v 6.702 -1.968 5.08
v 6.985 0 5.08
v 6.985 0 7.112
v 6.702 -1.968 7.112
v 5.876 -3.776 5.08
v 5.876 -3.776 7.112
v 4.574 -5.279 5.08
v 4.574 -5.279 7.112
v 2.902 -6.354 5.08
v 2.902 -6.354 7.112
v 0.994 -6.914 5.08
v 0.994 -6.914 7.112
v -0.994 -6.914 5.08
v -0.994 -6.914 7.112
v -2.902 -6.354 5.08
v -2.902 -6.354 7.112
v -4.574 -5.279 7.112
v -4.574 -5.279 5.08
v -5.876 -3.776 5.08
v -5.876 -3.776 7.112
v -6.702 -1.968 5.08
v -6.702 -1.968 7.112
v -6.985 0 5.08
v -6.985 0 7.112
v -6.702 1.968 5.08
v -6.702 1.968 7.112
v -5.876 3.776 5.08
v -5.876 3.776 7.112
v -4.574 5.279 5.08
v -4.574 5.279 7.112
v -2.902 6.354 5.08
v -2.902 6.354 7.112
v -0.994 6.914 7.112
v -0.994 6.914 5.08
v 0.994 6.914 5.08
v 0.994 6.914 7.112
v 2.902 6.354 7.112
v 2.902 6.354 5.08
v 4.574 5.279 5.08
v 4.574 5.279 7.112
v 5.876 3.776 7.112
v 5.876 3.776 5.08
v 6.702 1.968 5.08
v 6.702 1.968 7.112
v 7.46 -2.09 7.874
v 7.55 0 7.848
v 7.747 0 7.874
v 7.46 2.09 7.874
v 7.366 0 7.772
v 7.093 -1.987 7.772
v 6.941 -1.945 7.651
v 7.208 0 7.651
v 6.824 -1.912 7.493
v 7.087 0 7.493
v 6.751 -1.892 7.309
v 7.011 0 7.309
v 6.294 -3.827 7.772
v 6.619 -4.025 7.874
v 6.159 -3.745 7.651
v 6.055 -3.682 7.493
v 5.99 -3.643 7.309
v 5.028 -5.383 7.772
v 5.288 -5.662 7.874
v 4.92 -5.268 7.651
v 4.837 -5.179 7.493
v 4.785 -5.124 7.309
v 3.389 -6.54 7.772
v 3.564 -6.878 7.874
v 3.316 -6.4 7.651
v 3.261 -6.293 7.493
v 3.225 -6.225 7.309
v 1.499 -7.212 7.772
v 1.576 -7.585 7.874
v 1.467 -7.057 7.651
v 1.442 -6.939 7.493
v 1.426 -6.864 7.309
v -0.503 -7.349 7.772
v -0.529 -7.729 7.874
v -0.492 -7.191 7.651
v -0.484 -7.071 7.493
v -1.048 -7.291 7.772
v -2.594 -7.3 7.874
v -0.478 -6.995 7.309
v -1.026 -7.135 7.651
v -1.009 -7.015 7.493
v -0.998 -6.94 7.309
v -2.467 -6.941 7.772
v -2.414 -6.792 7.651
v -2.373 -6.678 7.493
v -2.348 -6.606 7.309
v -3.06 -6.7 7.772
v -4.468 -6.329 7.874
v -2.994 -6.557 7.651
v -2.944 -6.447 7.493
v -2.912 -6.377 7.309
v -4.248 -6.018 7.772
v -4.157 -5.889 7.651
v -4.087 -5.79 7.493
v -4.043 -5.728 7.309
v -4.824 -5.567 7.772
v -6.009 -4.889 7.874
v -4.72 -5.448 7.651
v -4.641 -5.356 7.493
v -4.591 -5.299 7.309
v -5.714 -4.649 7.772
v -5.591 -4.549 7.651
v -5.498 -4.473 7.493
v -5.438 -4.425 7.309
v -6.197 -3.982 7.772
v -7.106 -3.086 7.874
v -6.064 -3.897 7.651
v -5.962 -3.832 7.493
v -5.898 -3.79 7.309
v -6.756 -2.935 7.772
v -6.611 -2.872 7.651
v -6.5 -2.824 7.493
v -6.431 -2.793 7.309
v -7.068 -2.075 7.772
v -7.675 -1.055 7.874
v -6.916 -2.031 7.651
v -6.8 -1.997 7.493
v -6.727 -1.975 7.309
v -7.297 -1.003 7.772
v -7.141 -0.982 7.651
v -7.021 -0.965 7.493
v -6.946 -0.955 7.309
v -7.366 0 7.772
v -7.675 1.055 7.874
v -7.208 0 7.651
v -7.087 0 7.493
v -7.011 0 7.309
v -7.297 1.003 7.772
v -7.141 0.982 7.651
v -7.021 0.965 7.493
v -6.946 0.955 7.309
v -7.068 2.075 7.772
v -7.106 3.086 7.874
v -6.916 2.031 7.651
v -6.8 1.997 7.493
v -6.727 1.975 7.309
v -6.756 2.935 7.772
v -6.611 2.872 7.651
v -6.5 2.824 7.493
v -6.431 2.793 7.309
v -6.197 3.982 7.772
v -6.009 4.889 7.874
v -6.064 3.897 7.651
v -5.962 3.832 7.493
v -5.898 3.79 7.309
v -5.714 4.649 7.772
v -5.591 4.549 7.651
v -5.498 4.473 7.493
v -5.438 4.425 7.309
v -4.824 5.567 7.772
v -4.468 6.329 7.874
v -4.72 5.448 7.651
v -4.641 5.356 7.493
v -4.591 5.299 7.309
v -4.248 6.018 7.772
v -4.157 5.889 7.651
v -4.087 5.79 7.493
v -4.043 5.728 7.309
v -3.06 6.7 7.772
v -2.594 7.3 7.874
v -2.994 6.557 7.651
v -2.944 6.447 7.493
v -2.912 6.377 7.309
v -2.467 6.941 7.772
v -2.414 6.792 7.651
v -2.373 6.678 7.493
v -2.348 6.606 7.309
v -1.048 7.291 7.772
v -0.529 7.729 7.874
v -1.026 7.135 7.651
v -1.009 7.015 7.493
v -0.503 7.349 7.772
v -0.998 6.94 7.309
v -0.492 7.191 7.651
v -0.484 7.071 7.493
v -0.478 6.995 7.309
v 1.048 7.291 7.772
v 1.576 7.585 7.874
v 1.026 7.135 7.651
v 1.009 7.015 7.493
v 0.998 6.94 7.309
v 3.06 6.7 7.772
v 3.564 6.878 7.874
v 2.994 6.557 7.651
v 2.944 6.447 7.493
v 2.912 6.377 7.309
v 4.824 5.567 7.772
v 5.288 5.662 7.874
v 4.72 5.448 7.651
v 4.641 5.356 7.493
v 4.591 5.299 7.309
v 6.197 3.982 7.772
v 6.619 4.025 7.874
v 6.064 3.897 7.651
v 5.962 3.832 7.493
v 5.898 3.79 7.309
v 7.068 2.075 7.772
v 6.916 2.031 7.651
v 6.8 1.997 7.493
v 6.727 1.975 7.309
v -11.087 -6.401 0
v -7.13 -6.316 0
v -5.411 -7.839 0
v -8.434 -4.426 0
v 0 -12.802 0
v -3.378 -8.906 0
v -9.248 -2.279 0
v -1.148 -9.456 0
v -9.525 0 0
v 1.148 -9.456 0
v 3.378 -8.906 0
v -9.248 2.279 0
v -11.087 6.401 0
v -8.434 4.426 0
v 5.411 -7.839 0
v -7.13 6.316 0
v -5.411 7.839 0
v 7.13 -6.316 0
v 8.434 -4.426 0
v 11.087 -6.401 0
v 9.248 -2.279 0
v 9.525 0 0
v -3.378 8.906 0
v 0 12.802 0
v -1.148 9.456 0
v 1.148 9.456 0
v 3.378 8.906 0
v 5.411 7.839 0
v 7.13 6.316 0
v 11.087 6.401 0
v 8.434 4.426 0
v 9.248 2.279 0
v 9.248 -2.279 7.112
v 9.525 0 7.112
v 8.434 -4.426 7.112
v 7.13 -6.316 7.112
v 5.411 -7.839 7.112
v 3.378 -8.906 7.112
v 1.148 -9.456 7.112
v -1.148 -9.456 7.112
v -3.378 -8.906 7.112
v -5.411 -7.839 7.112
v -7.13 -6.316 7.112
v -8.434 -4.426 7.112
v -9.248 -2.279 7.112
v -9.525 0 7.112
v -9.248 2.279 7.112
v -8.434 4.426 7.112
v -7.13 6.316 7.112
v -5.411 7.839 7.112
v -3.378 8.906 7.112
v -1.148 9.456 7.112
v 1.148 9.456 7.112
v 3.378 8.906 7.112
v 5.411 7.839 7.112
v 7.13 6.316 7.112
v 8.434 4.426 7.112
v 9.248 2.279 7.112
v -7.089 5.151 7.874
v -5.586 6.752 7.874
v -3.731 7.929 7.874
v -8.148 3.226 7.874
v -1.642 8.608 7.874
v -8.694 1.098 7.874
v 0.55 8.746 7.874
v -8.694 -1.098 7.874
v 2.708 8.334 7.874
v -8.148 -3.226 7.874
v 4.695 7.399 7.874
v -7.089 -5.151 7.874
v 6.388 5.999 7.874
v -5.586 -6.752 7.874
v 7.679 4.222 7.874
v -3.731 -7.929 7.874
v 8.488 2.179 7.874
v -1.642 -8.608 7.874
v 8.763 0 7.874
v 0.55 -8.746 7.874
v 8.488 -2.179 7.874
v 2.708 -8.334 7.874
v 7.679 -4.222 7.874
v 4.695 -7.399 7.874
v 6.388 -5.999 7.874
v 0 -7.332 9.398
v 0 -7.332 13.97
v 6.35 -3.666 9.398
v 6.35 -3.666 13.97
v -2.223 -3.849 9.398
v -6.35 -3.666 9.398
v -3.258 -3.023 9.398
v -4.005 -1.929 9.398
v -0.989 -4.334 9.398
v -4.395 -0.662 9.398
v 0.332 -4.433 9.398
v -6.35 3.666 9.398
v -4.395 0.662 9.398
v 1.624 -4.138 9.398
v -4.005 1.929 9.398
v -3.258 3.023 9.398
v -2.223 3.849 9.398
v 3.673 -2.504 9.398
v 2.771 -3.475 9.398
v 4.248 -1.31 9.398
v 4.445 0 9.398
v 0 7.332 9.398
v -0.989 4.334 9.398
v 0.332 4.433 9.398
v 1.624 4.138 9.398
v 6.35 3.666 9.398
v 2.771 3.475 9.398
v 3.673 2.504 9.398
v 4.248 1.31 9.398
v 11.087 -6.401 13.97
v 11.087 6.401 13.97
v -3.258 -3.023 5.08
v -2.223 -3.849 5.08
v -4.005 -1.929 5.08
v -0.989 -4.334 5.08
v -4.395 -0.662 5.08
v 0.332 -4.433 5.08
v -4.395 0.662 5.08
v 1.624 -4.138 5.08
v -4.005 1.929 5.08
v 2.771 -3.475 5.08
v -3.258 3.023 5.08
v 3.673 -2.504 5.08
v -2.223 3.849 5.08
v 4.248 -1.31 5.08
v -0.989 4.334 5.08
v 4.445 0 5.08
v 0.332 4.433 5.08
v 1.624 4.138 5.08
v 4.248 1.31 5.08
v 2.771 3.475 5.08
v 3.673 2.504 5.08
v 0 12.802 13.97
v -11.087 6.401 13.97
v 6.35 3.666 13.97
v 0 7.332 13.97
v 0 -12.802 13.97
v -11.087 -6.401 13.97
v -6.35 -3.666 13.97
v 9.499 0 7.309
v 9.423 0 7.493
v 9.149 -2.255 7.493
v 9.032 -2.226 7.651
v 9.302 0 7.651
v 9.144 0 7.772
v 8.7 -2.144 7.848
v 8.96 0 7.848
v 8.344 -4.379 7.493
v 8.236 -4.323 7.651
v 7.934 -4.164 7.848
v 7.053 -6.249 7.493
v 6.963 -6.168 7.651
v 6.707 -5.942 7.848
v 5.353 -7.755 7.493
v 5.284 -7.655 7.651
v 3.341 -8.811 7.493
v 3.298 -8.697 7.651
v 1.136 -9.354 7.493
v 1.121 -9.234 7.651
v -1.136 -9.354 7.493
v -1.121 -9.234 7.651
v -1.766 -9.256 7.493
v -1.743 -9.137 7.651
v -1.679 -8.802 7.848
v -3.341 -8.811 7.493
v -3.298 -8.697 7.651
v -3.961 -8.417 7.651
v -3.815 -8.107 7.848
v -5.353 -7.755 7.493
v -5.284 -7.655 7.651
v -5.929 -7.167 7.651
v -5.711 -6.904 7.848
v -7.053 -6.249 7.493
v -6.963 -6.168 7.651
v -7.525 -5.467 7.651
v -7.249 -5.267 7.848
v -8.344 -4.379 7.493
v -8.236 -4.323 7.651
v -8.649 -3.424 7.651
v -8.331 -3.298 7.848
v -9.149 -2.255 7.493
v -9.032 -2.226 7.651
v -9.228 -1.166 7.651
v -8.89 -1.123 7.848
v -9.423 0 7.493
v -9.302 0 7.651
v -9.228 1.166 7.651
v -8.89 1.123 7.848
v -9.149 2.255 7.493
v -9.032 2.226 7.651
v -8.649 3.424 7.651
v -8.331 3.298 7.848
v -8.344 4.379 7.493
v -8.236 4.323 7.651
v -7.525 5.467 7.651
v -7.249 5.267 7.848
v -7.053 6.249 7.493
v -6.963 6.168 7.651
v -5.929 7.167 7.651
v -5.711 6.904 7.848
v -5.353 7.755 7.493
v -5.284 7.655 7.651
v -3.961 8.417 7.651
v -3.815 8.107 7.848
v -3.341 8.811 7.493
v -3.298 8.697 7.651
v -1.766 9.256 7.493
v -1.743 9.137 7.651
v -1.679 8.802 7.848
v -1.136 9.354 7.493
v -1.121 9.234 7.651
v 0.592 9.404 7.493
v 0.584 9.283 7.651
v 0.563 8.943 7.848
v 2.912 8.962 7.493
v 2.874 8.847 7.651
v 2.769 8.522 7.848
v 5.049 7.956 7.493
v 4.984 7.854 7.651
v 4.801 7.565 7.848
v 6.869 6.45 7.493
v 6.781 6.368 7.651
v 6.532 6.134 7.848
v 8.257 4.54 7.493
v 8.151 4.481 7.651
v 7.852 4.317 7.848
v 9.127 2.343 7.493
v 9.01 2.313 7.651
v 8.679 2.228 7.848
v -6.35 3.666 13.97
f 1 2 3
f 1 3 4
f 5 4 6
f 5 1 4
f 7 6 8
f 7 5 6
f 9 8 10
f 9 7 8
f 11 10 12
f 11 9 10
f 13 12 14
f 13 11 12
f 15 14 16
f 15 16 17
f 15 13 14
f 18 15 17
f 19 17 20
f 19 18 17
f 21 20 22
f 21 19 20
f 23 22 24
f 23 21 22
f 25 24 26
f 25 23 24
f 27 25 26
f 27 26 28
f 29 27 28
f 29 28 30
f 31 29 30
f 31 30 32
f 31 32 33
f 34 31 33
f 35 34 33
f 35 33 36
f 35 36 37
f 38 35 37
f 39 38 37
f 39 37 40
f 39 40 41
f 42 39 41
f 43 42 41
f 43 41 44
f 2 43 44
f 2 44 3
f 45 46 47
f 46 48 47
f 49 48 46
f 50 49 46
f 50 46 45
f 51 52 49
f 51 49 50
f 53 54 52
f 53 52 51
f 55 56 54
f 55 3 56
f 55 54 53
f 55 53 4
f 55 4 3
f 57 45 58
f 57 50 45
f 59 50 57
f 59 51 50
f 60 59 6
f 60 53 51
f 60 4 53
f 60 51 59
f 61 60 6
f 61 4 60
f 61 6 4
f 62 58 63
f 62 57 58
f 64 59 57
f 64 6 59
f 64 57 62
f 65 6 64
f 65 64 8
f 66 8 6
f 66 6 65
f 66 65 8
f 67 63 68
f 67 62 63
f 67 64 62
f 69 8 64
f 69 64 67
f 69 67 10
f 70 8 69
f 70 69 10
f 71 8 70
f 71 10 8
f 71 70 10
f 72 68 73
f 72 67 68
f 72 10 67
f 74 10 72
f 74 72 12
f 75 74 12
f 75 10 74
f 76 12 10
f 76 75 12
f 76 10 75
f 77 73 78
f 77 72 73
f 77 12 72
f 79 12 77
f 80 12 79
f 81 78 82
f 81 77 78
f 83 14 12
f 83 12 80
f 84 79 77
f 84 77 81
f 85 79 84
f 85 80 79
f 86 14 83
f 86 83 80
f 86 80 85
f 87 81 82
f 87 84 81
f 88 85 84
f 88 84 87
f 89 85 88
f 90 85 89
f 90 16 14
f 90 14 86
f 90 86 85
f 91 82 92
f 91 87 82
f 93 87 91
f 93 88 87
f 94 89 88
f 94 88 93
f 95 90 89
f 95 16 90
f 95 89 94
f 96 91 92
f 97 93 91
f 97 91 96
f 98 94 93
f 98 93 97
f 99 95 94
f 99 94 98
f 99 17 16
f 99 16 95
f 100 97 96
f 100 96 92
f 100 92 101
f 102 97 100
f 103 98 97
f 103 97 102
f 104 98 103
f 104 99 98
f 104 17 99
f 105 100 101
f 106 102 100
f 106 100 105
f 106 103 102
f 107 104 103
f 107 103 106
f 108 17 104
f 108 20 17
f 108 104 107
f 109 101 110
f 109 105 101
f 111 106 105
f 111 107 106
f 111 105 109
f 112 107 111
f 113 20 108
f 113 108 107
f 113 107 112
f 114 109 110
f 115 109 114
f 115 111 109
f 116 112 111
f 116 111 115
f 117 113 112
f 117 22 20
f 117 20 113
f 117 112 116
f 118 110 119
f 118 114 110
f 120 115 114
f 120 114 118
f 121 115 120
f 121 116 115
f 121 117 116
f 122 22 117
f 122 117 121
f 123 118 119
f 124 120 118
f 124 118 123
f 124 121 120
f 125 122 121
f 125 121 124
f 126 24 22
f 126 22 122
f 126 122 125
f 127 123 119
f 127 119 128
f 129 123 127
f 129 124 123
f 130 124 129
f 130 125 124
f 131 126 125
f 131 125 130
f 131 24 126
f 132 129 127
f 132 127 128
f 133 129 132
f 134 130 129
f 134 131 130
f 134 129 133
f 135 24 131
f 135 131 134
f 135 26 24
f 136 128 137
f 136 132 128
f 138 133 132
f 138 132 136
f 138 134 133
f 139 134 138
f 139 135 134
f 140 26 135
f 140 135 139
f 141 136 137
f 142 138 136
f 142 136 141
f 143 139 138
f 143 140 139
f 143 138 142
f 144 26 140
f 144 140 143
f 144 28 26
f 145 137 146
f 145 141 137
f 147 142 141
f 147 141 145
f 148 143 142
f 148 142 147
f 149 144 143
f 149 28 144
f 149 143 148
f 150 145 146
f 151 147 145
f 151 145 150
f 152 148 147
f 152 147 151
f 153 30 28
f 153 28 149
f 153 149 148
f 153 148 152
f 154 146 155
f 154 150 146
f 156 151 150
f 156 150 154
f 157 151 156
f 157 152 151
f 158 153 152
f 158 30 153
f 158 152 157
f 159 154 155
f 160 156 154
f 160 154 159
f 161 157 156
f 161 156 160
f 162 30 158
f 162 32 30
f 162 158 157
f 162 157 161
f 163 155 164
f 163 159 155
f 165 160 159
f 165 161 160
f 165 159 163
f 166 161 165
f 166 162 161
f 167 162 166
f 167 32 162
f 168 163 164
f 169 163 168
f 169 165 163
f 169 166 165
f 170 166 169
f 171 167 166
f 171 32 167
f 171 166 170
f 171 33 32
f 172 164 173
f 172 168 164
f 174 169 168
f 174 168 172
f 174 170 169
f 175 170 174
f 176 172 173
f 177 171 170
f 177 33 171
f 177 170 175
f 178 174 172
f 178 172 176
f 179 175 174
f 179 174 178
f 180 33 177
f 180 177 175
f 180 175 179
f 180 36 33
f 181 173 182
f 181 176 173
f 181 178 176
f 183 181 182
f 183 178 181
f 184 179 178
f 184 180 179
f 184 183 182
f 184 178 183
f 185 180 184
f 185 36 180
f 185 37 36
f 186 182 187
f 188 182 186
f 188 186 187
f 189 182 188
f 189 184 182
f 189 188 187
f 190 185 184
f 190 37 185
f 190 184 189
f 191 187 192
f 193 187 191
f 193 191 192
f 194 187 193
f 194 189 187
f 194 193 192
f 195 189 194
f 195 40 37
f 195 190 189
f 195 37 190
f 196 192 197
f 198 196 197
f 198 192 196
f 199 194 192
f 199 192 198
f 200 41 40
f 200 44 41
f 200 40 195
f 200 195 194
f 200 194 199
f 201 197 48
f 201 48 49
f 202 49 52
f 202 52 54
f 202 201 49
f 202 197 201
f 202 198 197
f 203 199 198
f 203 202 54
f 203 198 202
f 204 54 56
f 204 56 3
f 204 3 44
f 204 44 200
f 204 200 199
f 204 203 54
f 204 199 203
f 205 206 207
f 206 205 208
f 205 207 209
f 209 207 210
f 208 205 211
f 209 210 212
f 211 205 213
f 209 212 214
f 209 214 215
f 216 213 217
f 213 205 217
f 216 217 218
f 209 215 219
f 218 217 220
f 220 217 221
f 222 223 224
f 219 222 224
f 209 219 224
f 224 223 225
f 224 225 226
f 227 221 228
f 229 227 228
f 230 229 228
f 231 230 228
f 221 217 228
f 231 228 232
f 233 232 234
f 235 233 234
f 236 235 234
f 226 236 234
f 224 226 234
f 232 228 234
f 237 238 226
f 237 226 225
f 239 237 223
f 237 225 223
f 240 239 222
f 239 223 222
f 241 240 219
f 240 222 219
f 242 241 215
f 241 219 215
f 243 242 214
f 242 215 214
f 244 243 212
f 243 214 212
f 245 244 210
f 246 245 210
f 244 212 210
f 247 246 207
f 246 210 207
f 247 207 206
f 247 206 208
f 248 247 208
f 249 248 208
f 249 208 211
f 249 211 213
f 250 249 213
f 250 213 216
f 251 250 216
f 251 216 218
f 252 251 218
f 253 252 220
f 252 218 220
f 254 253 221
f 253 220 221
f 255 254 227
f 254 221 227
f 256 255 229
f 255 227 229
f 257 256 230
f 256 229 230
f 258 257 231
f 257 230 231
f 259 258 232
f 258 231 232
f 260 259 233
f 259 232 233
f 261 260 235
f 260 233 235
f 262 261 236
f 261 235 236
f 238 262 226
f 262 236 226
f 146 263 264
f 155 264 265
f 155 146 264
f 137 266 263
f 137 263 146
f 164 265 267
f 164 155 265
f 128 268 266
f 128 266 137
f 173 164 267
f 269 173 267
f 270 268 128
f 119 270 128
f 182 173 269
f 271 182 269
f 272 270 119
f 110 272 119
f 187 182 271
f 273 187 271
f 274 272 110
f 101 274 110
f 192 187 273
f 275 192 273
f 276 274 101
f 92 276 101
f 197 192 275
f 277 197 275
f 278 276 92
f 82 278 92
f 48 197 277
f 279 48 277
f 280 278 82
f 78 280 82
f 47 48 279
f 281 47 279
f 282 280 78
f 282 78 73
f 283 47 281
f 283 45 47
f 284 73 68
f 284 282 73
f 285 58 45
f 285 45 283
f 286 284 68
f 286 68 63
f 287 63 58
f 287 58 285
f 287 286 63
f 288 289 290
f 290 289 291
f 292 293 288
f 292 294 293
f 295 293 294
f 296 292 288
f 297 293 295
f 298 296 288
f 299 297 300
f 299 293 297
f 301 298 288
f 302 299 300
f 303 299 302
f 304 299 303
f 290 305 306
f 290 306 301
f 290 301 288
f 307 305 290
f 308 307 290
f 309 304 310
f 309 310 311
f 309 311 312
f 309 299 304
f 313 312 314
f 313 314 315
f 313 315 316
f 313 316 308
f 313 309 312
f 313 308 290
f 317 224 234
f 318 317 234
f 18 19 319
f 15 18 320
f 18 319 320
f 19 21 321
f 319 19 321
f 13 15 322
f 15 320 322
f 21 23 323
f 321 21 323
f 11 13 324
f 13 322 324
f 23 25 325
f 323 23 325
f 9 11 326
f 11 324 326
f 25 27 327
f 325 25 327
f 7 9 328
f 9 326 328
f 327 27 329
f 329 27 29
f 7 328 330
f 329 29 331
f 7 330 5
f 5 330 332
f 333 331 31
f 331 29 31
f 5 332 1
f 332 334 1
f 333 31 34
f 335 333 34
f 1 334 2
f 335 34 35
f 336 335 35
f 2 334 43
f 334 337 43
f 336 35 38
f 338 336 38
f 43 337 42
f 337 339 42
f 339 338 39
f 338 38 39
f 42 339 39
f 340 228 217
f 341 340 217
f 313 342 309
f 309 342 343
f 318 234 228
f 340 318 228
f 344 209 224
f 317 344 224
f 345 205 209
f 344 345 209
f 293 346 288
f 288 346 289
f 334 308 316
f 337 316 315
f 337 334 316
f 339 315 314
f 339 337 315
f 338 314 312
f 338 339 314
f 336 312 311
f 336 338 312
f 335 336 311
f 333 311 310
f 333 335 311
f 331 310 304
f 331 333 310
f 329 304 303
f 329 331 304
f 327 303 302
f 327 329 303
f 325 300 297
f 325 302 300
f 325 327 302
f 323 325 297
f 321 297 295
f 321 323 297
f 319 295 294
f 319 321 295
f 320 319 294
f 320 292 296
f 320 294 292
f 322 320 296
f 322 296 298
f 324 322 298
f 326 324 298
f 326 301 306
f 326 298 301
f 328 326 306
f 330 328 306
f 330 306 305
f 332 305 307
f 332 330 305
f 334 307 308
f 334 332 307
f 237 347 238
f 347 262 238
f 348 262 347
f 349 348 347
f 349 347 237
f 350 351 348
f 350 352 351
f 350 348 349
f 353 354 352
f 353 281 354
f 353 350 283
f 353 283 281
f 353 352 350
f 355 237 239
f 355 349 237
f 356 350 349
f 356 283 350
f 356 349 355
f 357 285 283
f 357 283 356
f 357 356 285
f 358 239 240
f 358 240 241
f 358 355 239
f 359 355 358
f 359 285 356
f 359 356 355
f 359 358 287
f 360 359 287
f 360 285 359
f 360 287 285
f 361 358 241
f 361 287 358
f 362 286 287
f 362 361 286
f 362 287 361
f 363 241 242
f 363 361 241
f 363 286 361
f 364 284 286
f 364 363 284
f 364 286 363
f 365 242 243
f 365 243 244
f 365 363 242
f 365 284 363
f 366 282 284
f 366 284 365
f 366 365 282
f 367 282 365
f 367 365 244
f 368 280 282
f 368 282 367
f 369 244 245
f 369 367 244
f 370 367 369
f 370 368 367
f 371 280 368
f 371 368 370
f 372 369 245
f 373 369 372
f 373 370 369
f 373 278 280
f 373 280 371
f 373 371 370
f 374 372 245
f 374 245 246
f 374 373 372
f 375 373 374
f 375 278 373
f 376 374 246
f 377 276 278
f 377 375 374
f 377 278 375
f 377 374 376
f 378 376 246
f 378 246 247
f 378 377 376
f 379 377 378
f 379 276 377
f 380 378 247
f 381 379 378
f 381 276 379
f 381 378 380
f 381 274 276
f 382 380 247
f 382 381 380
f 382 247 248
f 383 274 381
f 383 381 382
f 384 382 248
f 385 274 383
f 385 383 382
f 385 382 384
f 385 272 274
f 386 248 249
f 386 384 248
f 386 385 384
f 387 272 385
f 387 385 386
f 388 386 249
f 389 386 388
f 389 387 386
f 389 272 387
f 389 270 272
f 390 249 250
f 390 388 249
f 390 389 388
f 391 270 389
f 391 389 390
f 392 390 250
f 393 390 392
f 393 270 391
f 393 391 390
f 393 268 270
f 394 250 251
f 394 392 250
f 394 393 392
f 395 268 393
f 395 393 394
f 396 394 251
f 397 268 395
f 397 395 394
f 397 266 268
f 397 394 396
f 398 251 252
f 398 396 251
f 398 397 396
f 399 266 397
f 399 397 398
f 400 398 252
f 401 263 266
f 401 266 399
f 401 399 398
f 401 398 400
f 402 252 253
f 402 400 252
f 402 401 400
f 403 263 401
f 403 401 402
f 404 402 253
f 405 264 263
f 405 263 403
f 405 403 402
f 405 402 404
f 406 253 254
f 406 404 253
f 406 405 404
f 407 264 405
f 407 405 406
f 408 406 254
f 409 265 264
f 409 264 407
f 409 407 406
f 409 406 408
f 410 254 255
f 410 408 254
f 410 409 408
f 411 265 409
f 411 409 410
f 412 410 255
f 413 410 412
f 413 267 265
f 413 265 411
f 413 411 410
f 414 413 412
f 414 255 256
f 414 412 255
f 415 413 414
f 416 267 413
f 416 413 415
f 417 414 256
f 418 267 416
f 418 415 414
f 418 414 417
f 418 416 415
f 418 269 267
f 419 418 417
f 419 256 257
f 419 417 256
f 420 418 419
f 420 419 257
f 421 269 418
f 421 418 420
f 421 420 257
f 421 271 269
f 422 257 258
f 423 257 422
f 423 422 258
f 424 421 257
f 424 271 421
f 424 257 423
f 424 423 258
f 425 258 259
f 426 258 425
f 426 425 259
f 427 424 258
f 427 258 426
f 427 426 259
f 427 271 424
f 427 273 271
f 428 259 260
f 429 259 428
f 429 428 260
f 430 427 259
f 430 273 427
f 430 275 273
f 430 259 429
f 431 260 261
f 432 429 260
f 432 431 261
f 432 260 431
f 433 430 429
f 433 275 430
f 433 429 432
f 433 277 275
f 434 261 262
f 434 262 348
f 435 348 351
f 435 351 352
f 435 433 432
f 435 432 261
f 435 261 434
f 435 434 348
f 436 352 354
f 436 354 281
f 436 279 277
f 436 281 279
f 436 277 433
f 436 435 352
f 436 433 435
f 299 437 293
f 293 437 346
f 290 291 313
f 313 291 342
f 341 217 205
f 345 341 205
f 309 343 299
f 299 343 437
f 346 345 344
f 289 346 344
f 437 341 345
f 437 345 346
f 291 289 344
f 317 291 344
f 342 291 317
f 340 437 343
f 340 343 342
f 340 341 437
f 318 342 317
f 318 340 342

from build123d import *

# Parameters (mm, degrees)
F0_R     = 4.445
F1_DEPTH = 13.97
F2_R     = 9.525
F2_R_2   = 6.985
F3_DEPTH = 7.874
F5_DEPTH = 4.572
F6_R     = 0.762
F7_DEPTH = 5.08


with BuildPart() as f1:
    # F0 (on Top) → F1 (new body)
    with BuildSketch(Plane.XY):
        Polygon((11.0871, -6.4011401695), (11.0871, 6.4011401695), (0, 12.8022803391), (-11.0871, 6.4011401695), (-11.0871, -6.4011401695), (0, -12.8022803391), align=None)
        Circle(F0_R, mode=Mode.SUBTRACT)
    extrude(amount=F1_DEPTH)

    # F2 (on face) → F3 (cut)
    with BuildSketch(Plane(origin=(0, 0, 0), x_dir=(1, 0, 0), z_dir=(0, 0, -1))):
        Circle(F2_R)
        Circle(F2_R_2, mode=Mode.SUBTRACT)
    extrude(amount=-F3_DEPTH, mode=Mode.SUBTRACT)

    # F4 (on face) → F5 (cut)
    with BuildSketch(Plane.XY.offset(13.97)):
        Polygon((-6.35, 3.6661742094), (-6.35, -3.6661742094), (0, -7.3323484187), (6.35, -3.6661742094), (6.35, 3.6661742094), (0, 7.3323484187), align=None)
    extrude(amount=-F5_DEPTH, mode=Mode.SUBTRACT)

    # F6
    f6_edges = [f1.edges().sort_by_distance(p)[0] for p in [
        (-9.525, 0, 7.874),
        (-6.985, 0, 7.874),
    ]]
    fillet(f6_edges, radius=F6_R)

    # F7 (cut): a face of the model
    f7_faces = [f1.faces().sort_by_distance(p)[0] for p in [
        (-6.7874343653, 0, 0),
    ]]
    extrude(f7_faces, amount=-F7_DEPTH, mode=Mode.SUBTRACT)


solid = f1.part
